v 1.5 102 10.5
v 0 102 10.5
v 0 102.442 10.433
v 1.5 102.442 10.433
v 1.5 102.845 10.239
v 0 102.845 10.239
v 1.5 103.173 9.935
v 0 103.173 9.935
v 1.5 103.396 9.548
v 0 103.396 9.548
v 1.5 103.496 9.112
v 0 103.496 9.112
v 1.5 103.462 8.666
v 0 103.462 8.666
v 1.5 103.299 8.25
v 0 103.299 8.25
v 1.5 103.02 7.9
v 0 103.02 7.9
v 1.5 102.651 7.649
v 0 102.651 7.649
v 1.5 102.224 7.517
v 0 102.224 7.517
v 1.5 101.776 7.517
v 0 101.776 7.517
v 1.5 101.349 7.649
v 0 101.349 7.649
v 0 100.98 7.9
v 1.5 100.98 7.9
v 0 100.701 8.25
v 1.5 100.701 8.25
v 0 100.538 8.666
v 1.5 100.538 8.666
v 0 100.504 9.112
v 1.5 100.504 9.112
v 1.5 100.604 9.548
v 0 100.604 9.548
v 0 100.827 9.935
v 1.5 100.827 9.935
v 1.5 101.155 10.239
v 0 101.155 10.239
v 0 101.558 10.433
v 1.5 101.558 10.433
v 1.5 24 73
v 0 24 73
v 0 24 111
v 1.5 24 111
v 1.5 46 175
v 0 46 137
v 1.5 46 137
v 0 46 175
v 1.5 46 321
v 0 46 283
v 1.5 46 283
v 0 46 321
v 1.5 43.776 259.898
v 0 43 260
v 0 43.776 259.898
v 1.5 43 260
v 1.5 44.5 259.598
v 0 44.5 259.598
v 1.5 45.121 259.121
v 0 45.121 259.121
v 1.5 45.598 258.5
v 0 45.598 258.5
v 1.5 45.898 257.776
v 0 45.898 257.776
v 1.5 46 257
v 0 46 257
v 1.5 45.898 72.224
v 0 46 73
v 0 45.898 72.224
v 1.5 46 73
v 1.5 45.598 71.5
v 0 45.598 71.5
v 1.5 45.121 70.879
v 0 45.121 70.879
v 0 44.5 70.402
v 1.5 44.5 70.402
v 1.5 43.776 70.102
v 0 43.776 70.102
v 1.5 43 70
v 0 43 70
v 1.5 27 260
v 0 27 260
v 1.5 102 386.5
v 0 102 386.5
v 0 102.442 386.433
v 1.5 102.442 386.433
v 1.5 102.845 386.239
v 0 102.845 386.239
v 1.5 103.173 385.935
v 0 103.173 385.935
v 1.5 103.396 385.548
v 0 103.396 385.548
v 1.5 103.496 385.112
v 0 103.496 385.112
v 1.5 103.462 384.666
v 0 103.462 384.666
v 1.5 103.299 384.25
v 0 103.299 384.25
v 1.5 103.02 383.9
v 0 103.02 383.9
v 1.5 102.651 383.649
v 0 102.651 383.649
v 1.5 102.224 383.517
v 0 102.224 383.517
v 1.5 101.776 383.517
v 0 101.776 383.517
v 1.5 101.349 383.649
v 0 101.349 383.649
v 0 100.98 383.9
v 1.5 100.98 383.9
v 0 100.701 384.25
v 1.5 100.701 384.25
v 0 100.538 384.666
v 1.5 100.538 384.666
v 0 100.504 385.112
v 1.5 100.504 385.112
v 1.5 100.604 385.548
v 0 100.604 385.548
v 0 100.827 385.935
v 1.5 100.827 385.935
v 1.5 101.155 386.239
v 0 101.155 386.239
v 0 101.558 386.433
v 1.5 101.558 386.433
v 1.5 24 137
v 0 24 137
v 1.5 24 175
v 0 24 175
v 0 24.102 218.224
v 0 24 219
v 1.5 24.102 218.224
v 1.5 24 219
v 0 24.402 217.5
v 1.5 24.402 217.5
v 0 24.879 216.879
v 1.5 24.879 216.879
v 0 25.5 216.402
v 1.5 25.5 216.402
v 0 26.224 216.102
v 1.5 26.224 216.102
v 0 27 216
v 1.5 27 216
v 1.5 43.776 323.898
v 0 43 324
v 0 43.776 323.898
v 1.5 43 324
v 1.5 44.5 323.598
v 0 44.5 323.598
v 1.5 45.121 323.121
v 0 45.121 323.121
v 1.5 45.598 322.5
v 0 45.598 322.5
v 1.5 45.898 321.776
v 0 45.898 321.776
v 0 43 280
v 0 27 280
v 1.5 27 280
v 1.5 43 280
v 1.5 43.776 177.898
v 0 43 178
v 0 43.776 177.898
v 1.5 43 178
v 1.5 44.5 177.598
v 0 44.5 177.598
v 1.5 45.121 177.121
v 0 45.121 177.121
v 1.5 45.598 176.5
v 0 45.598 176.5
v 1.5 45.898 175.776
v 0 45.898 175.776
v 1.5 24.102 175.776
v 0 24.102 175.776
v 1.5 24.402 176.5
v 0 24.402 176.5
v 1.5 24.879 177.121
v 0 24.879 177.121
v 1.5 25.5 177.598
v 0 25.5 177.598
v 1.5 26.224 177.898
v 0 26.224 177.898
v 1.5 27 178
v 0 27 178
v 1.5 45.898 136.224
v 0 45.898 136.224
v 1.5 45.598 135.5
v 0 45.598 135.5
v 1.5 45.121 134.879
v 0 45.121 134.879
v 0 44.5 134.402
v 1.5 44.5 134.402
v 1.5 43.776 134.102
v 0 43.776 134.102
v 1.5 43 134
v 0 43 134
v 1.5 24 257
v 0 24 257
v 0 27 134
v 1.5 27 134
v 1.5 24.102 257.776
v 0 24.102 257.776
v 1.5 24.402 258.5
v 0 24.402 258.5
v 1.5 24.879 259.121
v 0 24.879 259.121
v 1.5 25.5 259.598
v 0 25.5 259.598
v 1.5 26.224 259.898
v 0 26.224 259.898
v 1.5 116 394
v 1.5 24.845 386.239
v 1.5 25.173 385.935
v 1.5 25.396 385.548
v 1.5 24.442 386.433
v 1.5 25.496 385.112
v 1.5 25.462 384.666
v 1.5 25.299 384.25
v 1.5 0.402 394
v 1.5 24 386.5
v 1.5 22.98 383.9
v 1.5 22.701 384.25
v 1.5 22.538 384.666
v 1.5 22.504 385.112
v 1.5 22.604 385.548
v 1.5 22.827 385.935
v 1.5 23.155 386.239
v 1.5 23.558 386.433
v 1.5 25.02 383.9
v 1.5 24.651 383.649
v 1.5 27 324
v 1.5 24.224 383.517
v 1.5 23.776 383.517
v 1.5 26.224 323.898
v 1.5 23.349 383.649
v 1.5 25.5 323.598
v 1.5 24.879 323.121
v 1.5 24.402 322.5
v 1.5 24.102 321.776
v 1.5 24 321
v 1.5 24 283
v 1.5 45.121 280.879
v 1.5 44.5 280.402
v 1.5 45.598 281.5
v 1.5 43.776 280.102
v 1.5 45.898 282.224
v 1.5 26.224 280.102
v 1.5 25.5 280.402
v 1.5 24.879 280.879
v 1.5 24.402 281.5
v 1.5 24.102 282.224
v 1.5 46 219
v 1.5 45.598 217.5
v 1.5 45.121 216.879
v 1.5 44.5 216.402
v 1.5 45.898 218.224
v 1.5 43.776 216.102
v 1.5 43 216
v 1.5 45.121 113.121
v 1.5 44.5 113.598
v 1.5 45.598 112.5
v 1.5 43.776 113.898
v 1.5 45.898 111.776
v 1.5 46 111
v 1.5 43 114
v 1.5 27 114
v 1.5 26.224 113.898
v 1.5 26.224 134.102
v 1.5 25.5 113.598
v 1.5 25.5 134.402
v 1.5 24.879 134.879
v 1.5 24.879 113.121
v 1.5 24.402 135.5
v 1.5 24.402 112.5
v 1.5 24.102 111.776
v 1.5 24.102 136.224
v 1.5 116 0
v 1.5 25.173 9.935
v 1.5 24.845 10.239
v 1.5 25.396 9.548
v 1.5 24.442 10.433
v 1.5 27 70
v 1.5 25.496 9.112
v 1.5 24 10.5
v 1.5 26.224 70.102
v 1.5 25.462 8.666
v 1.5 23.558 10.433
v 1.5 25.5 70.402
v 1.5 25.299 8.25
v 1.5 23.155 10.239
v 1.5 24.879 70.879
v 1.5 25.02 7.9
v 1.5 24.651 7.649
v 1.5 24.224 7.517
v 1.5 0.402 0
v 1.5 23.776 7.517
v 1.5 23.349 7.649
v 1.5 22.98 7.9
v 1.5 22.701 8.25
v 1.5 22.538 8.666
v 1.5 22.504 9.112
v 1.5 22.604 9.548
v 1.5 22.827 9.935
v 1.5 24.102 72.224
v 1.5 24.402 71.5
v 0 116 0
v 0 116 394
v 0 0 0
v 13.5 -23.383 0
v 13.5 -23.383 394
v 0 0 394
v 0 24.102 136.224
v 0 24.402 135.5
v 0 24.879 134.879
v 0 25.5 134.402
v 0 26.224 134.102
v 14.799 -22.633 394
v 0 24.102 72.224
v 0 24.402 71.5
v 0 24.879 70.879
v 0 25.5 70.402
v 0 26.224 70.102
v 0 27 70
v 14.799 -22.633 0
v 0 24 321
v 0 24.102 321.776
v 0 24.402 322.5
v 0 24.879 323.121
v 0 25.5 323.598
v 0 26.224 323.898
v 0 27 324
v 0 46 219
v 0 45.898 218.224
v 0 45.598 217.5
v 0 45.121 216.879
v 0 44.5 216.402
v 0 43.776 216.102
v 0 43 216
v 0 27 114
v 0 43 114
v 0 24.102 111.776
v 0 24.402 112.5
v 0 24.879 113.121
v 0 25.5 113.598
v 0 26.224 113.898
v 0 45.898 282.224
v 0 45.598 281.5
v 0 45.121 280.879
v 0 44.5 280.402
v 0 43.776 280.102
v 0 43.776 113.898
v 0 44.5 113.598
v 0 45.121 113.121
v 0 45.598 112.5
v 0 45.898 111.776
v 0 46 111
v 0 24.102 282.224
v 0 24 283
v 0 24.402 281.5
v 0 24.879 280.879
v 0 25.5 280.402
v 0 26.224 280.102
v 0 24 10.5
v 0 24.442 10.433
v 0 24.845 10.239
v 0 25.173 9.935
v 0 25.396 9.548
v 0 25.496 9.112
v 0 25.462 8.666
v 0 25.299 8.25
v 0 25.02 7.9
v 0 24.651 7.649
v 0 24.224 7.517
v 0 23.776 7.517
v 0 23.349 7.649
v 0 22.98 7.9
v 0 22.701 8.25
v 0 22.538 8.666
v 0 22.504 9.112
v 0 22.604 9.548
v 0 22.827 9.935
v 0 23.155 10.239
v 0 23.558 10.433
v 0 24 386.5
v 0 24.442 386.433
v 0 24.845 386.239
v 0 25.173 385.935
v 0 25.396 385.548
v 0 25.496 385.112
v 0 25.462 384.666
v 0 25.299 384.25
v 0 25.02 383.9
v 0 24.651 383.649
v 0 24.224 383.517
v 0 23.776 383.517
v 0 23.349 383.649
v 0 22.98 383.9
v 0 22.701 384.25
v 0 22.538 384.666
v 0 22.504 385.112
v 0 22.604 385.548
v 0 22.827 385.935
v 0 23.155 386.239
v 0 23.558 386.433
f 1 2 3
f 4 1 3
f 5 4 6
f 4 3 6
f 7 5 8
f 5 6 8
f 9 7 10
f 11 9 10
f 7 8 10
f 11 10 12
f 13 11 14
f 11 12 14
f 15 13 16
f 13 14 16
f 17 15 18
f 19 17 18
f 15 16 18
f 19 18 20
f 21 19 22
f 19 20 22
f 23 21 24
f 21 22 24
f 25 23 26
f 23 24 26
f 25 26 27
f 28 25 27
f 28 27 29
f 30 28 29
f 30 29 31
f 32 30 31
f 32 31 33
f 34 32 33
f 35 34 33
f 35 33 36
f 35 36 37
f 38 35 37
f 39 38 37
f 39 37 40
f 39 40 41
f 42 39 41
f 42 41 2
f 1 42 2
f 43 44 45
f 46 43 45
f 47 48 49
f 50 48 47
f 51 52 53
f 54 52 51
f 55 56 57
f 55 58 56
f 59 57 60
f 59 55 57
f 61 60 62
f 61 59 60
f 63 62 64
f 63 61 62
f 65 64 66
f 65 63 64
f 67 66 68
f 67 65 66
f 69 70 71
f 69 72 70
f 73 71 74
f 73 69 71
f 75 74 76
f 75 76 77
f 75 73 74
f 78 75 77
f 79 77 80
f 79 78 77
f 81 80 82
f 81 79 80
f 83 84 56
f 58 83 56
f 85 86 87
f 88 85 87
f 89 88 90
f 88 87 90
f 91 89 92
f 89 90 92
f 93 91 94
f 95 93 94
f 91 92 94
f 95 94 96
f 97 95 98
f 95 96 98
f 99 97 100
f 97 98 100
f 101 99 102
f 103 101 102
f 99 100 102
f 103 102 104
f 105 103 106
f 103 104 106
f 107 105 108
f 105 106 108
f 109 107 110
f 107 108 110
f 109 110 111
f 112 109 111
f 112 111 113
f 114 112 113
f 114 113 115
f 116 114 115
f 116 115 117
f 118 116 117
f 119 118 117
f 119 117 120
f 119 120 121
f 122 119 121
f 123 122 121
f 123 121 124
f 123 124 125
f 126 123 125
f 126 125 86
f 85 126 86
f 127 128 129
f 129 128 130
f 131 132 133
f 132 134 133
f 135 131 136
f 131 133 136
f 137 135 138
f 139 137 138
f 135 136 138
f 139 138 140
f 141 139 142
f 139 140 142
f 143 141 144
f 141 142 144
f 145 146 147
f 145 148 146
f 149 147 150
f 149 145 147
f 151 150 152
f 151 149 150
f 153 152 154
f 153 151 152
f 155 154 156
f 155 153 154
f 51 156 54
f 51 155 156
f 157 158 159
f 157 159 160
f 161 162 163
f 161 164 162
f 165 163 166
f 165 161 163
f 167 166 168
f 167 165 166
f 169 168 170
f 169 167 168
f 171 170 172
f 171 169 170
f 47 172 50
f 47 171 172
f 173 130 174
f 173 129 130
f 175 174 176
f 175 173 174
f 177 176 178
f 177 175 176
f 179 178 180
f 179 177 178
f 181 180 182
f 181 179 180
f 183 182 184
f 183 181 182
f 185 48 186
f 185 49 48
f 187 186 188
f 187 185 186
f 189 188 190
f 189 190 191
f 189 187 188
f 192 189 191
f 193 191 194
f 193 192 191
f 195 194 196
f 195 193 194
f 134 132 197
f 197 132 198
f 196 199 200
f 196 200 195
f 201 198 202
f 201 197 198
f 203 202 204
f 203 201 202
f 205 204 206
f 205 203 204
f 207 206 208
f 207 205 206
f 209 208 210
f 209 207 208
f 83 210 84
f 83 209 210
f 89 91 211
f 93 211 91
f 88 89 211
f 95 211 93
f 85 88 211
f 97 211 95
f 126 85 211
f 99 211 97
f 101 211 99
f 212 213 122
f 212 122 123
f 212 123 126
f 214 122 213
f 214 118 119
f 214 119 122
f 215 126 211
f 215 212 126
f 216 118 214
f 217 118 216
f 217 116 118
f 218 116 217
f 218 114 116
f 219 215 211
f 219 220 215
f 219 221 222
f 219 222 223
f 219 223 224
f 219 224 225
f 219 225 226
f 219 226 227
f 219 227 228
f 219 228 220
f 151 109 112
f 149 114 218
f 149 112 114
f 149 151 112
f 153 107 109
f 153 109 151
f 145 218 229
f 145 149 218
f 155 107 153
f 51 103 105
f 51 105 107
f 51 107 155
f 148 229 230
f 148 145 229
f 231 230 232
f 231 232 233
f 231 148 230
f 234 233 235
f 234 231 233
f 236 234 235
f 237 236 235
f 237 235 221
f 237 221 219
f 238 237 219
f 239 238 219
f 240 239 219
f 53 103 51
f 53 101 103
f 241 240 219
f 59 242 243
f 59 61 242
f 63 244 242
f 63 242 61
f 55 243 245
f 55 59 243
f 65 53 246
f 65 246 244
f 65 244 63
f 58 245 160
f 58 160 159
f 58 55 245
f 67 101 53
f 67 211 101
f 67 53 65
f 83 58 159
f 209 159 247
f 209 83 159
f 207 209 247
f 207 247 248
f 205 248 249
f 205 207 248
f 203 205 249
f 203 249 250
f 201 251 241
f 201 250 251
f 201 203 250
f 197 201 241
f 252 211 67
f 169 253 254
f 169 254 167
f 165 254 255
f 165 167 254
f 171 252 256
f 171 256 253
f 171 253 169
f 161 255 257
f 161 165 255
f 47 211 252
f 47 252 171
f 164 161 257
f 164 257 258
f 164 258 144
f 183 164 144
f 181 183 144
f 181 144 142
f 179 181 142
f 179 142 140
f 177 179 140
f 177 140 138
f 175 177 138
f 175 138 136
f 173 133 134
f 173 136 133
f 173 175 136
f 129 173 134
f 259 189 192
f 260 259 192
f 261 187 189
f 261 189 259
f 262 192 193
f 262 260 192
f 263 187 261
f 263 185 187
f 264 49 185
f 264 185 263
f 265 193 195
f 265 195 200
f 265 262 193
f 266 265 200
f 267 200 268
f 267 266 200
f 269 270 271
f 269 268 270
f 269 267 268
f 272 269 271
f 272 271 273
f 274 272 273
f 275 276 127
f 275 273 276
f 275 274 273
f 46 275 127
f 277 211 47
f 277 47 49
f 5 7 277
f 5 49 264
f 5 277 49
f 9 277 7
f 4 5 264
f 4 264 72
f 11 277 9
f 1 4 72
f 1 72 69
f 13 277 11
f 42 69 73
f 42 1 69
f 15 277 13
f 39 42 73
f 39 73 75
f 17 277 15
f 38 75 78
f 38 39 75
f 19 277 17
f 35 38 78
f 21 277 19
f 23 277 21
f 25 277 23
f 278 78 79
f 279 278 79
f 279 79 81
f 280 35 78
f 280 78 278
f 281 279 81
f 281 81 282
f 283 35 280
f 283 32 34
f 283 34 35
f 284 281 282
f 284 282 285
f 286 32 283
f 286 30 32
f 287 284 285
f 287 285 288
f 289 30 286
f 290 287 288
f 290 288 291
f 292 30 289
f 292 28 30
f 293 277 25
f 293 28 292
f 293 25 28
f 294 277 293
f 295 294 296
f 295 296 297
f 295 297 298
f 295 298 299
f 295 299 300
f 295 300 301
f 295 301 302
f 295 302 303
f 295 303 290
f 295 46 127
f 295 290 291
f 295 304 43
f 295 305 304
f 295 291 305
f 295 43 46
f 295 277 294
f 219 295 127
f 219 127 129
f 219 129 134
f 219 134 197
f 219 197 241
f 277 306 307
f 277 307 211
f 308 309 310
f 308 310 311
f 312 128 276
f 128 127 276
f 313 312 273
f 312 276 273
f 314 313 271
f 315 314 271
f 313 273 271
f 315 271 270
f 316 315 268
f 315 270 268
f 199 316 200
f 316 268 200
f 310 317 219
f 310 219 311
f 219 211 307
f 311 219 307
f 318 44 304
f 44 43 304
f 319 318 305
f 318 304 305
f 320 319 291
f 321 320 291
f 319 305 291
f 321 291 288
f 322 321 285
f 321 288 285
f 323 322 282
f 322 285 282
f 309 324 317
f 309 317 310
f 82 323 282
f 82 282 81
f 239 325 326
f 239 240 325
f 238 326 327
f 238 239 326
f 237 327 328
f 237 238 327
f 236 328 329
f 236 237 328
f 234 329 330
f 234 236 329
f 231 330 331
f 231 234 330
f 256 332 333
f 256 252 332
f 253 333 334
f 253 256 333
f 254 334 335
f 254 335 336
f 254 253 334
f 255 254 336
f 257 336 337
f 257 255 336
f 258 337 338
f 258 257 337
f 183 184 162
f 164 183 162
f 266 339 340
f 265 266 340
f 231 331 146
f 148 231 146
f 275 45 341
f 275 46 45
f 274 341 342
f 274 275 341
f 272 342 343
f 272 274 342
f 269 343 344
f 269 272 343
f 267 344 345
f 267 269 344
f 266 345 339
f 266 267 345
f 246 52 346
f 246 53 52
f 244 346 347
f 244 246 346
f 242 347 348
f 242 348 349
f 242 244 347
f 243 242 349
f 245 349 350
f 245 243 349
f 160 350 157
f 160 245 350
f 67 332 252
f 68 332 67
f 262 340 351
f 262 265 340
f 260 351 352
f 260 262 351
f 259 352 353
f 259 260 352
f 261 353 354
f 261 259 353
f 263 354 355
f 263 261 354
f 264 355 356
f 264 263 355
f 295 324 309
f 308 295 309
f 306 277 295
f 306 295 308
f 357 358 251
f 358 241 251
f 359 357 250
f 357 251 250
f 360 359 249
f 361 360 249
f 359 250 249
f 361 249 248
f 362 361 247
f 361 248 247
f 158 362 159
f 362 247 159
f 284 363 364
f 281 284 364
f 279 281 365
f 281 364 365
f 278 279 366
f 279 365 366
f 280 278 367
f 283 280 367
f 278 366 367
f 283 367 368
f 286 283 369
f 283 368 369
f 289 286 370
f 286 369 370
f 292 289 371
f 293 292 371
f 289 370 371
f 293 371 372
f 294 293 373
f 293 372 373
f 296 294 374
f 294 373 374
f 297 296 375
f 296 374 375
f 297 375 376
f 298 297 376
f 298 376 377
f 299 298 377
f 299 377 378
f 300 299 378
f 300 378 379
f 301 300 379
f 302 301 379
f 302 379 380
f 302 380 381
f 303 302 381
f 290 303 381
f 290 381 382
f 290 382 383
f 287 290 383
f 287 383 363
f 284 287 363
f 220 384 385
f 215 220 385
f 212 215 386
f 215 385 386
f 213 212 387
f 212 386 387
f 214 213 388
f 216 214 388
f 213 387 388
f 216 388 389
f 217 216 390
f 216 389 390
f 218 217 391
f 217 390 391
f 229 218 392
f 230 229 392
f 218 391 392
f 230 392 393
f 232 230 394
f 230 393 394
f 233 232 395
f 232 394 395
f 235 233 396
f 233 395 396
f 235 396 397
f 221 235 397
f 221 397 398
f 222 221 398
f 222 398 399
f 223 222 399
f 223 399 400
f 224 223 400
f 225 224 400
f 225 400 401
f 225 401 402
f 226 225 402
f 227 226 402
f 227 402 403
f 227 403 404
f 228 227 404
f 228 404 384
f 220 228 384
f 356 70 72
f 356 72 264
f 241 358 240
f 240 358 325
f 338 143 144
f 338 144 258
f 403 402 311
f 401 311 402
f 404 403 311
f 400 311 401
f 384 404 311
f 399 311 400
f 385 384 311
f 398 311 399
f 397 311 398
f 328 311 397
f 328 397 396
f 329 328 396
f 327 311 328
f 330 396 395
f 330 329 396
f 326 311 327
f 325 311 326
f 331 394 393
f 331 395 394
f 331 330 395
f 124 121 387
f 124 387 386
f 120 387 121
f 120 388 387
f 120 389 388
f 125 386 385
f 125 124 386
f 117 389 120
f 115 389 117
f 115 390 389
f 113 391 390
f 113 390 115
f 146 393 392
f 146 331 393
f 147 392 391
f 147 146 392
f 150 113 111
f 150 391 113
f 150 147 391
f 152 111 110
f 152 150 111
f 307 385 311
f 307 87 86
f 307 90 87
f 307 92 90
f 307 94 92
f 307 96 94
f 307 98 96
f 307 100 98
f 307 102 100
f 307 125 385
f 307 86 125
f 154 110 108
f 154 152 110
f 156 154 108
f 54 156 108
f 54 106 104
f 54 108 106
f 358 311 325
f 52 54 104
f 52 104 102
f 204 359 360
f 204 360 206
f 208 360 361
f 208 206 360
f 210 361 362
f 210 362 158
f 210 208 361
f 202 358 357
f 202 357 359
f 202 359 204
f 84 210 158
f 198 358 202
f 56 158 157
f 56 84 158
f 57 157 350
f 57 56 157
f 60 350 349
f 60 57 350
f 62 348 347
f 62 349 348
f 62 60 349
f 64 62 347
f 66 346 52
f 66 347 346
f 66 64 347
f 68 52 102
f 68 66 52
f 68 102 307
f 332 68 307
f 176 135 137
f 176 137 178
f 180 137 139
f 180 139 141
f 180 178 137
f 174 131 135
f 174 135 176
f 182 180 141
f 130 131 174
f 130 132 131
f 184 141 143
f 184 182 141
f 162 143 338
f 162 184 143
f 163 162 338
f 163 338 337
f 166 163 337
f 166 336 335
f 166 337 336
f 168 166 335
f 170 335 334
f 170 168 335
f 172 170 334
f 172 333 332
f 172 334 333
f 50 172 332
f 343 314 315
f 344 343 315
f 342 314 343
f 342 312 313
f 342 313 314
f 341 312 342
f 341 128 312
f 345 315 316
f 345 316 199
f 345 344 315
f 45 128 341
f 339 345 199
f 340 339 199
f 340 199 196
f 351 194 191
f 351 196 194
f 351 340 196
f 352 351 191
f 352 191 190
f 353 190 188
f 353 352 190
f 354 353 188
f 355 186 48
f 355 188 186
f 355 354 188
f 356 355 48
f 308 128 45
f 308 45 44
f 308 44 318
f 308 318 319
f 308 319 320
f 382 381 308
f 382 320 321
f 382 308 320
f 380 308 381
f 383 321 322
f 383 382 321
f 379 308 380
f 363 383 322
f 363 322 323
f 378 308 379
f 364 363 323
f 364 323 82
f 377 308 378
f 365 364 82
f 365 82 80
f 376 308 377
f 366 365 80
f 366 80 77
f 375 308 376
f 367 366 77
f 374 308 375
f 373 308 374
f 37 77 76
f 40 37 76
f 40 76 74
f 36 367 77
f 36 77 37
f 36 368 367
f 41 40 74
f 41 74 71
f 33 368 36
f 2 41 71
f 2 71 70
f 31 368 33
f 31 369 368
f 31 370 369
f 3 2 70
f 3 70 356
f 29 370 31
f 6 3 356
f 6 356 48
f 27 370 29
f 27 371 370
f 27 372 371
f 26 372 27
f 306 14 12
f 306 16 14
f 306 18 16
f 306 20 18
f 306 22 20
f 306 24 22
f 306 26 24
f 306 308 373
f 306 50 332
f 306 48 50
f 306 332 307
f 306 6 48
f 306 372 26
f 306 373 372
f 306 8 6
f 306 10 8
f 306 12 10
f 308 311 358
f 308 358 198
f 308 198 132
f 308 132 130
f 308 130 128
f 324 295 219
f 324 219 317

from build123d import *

# Parameters (mm, degrees)
EXTRUDE_1_DEPTH     = 394
SKETCH_2_R          = 1.5
SKETCH_2_W          = 44
SKETCH_2_H          = 22
CUT_EXTRUDE_1_DEPTH = 411.987848396
FILLET_1_R          = 3


with BuildPart() as part:
    # 草图1 → 凸台-拉伸1 (new body)
    with BuildSketch(Plane.XY):
        Polygon((0, 0), (0, 116), (1.5, 116), (1.5, 0.401923789), (14.799038106, -22.632685902), (13.5, -23.382685902), align=None)
    extrude(amount=EXTRUDE_1_DEPTH)

    # 草图2 → 切除-拉伸1 (cut, through all)
    with BuildSketch(Plane.ZY):
        with Locations((385, 24)):
            Circle(SKETCH_2_R)
        with Locations((385, 102)):
            Circle(SKETCH_2_R)
        with Locations((9, 102)):
            Circle(SKETCH_2_R)
        with Locations((9, 24)):
            Circle(SKETCH_2_R)
        with Locations((156, 35)):
            Rectangle(SKETCH_2_W, SKETCH_2_H)
        with Locations((238, 35)):
            Rectangle(SKETCH_2_W, SKETCH_2_H)
        with Locations((302, 35)):
            Rectangle(SKETCH_2_W, SKETCH_2_H)
        with Locations((92, 35)):
            Rectangle(SKETCH_2_W, SKETCH_2_H)
    extrude(amount=-CUT_EXTRUDE_1_DEPTH, mode=Mode.SUBTRACT)

    # 圆角1
    fillet_1_edges = [part.edges().sort_by_distance(p)[0] for p in [
        (0.75, 24, 216),
        (0.75, 46, 216),
        (0.75, 46, 260),
        (0.75, 24, 260),
        (0.75, 24, 280),
        (0.75, 46, 280),
        (0.75, 46, 324),
        (0.75, 24, 324),
        (0.75, 46, 178),
        (0.75, 24, 178),
        (0.75, 24, 134),
        (0.75, 46, 134),
        (0.75, 46, 70),
        (0.75, 46, 114),
        (0.75, 24, 114),
        (0.75, 24, 70),
    ]]
    fillet(fillet_1_edges, radius=FILLET_1_R)


solid = part.part
